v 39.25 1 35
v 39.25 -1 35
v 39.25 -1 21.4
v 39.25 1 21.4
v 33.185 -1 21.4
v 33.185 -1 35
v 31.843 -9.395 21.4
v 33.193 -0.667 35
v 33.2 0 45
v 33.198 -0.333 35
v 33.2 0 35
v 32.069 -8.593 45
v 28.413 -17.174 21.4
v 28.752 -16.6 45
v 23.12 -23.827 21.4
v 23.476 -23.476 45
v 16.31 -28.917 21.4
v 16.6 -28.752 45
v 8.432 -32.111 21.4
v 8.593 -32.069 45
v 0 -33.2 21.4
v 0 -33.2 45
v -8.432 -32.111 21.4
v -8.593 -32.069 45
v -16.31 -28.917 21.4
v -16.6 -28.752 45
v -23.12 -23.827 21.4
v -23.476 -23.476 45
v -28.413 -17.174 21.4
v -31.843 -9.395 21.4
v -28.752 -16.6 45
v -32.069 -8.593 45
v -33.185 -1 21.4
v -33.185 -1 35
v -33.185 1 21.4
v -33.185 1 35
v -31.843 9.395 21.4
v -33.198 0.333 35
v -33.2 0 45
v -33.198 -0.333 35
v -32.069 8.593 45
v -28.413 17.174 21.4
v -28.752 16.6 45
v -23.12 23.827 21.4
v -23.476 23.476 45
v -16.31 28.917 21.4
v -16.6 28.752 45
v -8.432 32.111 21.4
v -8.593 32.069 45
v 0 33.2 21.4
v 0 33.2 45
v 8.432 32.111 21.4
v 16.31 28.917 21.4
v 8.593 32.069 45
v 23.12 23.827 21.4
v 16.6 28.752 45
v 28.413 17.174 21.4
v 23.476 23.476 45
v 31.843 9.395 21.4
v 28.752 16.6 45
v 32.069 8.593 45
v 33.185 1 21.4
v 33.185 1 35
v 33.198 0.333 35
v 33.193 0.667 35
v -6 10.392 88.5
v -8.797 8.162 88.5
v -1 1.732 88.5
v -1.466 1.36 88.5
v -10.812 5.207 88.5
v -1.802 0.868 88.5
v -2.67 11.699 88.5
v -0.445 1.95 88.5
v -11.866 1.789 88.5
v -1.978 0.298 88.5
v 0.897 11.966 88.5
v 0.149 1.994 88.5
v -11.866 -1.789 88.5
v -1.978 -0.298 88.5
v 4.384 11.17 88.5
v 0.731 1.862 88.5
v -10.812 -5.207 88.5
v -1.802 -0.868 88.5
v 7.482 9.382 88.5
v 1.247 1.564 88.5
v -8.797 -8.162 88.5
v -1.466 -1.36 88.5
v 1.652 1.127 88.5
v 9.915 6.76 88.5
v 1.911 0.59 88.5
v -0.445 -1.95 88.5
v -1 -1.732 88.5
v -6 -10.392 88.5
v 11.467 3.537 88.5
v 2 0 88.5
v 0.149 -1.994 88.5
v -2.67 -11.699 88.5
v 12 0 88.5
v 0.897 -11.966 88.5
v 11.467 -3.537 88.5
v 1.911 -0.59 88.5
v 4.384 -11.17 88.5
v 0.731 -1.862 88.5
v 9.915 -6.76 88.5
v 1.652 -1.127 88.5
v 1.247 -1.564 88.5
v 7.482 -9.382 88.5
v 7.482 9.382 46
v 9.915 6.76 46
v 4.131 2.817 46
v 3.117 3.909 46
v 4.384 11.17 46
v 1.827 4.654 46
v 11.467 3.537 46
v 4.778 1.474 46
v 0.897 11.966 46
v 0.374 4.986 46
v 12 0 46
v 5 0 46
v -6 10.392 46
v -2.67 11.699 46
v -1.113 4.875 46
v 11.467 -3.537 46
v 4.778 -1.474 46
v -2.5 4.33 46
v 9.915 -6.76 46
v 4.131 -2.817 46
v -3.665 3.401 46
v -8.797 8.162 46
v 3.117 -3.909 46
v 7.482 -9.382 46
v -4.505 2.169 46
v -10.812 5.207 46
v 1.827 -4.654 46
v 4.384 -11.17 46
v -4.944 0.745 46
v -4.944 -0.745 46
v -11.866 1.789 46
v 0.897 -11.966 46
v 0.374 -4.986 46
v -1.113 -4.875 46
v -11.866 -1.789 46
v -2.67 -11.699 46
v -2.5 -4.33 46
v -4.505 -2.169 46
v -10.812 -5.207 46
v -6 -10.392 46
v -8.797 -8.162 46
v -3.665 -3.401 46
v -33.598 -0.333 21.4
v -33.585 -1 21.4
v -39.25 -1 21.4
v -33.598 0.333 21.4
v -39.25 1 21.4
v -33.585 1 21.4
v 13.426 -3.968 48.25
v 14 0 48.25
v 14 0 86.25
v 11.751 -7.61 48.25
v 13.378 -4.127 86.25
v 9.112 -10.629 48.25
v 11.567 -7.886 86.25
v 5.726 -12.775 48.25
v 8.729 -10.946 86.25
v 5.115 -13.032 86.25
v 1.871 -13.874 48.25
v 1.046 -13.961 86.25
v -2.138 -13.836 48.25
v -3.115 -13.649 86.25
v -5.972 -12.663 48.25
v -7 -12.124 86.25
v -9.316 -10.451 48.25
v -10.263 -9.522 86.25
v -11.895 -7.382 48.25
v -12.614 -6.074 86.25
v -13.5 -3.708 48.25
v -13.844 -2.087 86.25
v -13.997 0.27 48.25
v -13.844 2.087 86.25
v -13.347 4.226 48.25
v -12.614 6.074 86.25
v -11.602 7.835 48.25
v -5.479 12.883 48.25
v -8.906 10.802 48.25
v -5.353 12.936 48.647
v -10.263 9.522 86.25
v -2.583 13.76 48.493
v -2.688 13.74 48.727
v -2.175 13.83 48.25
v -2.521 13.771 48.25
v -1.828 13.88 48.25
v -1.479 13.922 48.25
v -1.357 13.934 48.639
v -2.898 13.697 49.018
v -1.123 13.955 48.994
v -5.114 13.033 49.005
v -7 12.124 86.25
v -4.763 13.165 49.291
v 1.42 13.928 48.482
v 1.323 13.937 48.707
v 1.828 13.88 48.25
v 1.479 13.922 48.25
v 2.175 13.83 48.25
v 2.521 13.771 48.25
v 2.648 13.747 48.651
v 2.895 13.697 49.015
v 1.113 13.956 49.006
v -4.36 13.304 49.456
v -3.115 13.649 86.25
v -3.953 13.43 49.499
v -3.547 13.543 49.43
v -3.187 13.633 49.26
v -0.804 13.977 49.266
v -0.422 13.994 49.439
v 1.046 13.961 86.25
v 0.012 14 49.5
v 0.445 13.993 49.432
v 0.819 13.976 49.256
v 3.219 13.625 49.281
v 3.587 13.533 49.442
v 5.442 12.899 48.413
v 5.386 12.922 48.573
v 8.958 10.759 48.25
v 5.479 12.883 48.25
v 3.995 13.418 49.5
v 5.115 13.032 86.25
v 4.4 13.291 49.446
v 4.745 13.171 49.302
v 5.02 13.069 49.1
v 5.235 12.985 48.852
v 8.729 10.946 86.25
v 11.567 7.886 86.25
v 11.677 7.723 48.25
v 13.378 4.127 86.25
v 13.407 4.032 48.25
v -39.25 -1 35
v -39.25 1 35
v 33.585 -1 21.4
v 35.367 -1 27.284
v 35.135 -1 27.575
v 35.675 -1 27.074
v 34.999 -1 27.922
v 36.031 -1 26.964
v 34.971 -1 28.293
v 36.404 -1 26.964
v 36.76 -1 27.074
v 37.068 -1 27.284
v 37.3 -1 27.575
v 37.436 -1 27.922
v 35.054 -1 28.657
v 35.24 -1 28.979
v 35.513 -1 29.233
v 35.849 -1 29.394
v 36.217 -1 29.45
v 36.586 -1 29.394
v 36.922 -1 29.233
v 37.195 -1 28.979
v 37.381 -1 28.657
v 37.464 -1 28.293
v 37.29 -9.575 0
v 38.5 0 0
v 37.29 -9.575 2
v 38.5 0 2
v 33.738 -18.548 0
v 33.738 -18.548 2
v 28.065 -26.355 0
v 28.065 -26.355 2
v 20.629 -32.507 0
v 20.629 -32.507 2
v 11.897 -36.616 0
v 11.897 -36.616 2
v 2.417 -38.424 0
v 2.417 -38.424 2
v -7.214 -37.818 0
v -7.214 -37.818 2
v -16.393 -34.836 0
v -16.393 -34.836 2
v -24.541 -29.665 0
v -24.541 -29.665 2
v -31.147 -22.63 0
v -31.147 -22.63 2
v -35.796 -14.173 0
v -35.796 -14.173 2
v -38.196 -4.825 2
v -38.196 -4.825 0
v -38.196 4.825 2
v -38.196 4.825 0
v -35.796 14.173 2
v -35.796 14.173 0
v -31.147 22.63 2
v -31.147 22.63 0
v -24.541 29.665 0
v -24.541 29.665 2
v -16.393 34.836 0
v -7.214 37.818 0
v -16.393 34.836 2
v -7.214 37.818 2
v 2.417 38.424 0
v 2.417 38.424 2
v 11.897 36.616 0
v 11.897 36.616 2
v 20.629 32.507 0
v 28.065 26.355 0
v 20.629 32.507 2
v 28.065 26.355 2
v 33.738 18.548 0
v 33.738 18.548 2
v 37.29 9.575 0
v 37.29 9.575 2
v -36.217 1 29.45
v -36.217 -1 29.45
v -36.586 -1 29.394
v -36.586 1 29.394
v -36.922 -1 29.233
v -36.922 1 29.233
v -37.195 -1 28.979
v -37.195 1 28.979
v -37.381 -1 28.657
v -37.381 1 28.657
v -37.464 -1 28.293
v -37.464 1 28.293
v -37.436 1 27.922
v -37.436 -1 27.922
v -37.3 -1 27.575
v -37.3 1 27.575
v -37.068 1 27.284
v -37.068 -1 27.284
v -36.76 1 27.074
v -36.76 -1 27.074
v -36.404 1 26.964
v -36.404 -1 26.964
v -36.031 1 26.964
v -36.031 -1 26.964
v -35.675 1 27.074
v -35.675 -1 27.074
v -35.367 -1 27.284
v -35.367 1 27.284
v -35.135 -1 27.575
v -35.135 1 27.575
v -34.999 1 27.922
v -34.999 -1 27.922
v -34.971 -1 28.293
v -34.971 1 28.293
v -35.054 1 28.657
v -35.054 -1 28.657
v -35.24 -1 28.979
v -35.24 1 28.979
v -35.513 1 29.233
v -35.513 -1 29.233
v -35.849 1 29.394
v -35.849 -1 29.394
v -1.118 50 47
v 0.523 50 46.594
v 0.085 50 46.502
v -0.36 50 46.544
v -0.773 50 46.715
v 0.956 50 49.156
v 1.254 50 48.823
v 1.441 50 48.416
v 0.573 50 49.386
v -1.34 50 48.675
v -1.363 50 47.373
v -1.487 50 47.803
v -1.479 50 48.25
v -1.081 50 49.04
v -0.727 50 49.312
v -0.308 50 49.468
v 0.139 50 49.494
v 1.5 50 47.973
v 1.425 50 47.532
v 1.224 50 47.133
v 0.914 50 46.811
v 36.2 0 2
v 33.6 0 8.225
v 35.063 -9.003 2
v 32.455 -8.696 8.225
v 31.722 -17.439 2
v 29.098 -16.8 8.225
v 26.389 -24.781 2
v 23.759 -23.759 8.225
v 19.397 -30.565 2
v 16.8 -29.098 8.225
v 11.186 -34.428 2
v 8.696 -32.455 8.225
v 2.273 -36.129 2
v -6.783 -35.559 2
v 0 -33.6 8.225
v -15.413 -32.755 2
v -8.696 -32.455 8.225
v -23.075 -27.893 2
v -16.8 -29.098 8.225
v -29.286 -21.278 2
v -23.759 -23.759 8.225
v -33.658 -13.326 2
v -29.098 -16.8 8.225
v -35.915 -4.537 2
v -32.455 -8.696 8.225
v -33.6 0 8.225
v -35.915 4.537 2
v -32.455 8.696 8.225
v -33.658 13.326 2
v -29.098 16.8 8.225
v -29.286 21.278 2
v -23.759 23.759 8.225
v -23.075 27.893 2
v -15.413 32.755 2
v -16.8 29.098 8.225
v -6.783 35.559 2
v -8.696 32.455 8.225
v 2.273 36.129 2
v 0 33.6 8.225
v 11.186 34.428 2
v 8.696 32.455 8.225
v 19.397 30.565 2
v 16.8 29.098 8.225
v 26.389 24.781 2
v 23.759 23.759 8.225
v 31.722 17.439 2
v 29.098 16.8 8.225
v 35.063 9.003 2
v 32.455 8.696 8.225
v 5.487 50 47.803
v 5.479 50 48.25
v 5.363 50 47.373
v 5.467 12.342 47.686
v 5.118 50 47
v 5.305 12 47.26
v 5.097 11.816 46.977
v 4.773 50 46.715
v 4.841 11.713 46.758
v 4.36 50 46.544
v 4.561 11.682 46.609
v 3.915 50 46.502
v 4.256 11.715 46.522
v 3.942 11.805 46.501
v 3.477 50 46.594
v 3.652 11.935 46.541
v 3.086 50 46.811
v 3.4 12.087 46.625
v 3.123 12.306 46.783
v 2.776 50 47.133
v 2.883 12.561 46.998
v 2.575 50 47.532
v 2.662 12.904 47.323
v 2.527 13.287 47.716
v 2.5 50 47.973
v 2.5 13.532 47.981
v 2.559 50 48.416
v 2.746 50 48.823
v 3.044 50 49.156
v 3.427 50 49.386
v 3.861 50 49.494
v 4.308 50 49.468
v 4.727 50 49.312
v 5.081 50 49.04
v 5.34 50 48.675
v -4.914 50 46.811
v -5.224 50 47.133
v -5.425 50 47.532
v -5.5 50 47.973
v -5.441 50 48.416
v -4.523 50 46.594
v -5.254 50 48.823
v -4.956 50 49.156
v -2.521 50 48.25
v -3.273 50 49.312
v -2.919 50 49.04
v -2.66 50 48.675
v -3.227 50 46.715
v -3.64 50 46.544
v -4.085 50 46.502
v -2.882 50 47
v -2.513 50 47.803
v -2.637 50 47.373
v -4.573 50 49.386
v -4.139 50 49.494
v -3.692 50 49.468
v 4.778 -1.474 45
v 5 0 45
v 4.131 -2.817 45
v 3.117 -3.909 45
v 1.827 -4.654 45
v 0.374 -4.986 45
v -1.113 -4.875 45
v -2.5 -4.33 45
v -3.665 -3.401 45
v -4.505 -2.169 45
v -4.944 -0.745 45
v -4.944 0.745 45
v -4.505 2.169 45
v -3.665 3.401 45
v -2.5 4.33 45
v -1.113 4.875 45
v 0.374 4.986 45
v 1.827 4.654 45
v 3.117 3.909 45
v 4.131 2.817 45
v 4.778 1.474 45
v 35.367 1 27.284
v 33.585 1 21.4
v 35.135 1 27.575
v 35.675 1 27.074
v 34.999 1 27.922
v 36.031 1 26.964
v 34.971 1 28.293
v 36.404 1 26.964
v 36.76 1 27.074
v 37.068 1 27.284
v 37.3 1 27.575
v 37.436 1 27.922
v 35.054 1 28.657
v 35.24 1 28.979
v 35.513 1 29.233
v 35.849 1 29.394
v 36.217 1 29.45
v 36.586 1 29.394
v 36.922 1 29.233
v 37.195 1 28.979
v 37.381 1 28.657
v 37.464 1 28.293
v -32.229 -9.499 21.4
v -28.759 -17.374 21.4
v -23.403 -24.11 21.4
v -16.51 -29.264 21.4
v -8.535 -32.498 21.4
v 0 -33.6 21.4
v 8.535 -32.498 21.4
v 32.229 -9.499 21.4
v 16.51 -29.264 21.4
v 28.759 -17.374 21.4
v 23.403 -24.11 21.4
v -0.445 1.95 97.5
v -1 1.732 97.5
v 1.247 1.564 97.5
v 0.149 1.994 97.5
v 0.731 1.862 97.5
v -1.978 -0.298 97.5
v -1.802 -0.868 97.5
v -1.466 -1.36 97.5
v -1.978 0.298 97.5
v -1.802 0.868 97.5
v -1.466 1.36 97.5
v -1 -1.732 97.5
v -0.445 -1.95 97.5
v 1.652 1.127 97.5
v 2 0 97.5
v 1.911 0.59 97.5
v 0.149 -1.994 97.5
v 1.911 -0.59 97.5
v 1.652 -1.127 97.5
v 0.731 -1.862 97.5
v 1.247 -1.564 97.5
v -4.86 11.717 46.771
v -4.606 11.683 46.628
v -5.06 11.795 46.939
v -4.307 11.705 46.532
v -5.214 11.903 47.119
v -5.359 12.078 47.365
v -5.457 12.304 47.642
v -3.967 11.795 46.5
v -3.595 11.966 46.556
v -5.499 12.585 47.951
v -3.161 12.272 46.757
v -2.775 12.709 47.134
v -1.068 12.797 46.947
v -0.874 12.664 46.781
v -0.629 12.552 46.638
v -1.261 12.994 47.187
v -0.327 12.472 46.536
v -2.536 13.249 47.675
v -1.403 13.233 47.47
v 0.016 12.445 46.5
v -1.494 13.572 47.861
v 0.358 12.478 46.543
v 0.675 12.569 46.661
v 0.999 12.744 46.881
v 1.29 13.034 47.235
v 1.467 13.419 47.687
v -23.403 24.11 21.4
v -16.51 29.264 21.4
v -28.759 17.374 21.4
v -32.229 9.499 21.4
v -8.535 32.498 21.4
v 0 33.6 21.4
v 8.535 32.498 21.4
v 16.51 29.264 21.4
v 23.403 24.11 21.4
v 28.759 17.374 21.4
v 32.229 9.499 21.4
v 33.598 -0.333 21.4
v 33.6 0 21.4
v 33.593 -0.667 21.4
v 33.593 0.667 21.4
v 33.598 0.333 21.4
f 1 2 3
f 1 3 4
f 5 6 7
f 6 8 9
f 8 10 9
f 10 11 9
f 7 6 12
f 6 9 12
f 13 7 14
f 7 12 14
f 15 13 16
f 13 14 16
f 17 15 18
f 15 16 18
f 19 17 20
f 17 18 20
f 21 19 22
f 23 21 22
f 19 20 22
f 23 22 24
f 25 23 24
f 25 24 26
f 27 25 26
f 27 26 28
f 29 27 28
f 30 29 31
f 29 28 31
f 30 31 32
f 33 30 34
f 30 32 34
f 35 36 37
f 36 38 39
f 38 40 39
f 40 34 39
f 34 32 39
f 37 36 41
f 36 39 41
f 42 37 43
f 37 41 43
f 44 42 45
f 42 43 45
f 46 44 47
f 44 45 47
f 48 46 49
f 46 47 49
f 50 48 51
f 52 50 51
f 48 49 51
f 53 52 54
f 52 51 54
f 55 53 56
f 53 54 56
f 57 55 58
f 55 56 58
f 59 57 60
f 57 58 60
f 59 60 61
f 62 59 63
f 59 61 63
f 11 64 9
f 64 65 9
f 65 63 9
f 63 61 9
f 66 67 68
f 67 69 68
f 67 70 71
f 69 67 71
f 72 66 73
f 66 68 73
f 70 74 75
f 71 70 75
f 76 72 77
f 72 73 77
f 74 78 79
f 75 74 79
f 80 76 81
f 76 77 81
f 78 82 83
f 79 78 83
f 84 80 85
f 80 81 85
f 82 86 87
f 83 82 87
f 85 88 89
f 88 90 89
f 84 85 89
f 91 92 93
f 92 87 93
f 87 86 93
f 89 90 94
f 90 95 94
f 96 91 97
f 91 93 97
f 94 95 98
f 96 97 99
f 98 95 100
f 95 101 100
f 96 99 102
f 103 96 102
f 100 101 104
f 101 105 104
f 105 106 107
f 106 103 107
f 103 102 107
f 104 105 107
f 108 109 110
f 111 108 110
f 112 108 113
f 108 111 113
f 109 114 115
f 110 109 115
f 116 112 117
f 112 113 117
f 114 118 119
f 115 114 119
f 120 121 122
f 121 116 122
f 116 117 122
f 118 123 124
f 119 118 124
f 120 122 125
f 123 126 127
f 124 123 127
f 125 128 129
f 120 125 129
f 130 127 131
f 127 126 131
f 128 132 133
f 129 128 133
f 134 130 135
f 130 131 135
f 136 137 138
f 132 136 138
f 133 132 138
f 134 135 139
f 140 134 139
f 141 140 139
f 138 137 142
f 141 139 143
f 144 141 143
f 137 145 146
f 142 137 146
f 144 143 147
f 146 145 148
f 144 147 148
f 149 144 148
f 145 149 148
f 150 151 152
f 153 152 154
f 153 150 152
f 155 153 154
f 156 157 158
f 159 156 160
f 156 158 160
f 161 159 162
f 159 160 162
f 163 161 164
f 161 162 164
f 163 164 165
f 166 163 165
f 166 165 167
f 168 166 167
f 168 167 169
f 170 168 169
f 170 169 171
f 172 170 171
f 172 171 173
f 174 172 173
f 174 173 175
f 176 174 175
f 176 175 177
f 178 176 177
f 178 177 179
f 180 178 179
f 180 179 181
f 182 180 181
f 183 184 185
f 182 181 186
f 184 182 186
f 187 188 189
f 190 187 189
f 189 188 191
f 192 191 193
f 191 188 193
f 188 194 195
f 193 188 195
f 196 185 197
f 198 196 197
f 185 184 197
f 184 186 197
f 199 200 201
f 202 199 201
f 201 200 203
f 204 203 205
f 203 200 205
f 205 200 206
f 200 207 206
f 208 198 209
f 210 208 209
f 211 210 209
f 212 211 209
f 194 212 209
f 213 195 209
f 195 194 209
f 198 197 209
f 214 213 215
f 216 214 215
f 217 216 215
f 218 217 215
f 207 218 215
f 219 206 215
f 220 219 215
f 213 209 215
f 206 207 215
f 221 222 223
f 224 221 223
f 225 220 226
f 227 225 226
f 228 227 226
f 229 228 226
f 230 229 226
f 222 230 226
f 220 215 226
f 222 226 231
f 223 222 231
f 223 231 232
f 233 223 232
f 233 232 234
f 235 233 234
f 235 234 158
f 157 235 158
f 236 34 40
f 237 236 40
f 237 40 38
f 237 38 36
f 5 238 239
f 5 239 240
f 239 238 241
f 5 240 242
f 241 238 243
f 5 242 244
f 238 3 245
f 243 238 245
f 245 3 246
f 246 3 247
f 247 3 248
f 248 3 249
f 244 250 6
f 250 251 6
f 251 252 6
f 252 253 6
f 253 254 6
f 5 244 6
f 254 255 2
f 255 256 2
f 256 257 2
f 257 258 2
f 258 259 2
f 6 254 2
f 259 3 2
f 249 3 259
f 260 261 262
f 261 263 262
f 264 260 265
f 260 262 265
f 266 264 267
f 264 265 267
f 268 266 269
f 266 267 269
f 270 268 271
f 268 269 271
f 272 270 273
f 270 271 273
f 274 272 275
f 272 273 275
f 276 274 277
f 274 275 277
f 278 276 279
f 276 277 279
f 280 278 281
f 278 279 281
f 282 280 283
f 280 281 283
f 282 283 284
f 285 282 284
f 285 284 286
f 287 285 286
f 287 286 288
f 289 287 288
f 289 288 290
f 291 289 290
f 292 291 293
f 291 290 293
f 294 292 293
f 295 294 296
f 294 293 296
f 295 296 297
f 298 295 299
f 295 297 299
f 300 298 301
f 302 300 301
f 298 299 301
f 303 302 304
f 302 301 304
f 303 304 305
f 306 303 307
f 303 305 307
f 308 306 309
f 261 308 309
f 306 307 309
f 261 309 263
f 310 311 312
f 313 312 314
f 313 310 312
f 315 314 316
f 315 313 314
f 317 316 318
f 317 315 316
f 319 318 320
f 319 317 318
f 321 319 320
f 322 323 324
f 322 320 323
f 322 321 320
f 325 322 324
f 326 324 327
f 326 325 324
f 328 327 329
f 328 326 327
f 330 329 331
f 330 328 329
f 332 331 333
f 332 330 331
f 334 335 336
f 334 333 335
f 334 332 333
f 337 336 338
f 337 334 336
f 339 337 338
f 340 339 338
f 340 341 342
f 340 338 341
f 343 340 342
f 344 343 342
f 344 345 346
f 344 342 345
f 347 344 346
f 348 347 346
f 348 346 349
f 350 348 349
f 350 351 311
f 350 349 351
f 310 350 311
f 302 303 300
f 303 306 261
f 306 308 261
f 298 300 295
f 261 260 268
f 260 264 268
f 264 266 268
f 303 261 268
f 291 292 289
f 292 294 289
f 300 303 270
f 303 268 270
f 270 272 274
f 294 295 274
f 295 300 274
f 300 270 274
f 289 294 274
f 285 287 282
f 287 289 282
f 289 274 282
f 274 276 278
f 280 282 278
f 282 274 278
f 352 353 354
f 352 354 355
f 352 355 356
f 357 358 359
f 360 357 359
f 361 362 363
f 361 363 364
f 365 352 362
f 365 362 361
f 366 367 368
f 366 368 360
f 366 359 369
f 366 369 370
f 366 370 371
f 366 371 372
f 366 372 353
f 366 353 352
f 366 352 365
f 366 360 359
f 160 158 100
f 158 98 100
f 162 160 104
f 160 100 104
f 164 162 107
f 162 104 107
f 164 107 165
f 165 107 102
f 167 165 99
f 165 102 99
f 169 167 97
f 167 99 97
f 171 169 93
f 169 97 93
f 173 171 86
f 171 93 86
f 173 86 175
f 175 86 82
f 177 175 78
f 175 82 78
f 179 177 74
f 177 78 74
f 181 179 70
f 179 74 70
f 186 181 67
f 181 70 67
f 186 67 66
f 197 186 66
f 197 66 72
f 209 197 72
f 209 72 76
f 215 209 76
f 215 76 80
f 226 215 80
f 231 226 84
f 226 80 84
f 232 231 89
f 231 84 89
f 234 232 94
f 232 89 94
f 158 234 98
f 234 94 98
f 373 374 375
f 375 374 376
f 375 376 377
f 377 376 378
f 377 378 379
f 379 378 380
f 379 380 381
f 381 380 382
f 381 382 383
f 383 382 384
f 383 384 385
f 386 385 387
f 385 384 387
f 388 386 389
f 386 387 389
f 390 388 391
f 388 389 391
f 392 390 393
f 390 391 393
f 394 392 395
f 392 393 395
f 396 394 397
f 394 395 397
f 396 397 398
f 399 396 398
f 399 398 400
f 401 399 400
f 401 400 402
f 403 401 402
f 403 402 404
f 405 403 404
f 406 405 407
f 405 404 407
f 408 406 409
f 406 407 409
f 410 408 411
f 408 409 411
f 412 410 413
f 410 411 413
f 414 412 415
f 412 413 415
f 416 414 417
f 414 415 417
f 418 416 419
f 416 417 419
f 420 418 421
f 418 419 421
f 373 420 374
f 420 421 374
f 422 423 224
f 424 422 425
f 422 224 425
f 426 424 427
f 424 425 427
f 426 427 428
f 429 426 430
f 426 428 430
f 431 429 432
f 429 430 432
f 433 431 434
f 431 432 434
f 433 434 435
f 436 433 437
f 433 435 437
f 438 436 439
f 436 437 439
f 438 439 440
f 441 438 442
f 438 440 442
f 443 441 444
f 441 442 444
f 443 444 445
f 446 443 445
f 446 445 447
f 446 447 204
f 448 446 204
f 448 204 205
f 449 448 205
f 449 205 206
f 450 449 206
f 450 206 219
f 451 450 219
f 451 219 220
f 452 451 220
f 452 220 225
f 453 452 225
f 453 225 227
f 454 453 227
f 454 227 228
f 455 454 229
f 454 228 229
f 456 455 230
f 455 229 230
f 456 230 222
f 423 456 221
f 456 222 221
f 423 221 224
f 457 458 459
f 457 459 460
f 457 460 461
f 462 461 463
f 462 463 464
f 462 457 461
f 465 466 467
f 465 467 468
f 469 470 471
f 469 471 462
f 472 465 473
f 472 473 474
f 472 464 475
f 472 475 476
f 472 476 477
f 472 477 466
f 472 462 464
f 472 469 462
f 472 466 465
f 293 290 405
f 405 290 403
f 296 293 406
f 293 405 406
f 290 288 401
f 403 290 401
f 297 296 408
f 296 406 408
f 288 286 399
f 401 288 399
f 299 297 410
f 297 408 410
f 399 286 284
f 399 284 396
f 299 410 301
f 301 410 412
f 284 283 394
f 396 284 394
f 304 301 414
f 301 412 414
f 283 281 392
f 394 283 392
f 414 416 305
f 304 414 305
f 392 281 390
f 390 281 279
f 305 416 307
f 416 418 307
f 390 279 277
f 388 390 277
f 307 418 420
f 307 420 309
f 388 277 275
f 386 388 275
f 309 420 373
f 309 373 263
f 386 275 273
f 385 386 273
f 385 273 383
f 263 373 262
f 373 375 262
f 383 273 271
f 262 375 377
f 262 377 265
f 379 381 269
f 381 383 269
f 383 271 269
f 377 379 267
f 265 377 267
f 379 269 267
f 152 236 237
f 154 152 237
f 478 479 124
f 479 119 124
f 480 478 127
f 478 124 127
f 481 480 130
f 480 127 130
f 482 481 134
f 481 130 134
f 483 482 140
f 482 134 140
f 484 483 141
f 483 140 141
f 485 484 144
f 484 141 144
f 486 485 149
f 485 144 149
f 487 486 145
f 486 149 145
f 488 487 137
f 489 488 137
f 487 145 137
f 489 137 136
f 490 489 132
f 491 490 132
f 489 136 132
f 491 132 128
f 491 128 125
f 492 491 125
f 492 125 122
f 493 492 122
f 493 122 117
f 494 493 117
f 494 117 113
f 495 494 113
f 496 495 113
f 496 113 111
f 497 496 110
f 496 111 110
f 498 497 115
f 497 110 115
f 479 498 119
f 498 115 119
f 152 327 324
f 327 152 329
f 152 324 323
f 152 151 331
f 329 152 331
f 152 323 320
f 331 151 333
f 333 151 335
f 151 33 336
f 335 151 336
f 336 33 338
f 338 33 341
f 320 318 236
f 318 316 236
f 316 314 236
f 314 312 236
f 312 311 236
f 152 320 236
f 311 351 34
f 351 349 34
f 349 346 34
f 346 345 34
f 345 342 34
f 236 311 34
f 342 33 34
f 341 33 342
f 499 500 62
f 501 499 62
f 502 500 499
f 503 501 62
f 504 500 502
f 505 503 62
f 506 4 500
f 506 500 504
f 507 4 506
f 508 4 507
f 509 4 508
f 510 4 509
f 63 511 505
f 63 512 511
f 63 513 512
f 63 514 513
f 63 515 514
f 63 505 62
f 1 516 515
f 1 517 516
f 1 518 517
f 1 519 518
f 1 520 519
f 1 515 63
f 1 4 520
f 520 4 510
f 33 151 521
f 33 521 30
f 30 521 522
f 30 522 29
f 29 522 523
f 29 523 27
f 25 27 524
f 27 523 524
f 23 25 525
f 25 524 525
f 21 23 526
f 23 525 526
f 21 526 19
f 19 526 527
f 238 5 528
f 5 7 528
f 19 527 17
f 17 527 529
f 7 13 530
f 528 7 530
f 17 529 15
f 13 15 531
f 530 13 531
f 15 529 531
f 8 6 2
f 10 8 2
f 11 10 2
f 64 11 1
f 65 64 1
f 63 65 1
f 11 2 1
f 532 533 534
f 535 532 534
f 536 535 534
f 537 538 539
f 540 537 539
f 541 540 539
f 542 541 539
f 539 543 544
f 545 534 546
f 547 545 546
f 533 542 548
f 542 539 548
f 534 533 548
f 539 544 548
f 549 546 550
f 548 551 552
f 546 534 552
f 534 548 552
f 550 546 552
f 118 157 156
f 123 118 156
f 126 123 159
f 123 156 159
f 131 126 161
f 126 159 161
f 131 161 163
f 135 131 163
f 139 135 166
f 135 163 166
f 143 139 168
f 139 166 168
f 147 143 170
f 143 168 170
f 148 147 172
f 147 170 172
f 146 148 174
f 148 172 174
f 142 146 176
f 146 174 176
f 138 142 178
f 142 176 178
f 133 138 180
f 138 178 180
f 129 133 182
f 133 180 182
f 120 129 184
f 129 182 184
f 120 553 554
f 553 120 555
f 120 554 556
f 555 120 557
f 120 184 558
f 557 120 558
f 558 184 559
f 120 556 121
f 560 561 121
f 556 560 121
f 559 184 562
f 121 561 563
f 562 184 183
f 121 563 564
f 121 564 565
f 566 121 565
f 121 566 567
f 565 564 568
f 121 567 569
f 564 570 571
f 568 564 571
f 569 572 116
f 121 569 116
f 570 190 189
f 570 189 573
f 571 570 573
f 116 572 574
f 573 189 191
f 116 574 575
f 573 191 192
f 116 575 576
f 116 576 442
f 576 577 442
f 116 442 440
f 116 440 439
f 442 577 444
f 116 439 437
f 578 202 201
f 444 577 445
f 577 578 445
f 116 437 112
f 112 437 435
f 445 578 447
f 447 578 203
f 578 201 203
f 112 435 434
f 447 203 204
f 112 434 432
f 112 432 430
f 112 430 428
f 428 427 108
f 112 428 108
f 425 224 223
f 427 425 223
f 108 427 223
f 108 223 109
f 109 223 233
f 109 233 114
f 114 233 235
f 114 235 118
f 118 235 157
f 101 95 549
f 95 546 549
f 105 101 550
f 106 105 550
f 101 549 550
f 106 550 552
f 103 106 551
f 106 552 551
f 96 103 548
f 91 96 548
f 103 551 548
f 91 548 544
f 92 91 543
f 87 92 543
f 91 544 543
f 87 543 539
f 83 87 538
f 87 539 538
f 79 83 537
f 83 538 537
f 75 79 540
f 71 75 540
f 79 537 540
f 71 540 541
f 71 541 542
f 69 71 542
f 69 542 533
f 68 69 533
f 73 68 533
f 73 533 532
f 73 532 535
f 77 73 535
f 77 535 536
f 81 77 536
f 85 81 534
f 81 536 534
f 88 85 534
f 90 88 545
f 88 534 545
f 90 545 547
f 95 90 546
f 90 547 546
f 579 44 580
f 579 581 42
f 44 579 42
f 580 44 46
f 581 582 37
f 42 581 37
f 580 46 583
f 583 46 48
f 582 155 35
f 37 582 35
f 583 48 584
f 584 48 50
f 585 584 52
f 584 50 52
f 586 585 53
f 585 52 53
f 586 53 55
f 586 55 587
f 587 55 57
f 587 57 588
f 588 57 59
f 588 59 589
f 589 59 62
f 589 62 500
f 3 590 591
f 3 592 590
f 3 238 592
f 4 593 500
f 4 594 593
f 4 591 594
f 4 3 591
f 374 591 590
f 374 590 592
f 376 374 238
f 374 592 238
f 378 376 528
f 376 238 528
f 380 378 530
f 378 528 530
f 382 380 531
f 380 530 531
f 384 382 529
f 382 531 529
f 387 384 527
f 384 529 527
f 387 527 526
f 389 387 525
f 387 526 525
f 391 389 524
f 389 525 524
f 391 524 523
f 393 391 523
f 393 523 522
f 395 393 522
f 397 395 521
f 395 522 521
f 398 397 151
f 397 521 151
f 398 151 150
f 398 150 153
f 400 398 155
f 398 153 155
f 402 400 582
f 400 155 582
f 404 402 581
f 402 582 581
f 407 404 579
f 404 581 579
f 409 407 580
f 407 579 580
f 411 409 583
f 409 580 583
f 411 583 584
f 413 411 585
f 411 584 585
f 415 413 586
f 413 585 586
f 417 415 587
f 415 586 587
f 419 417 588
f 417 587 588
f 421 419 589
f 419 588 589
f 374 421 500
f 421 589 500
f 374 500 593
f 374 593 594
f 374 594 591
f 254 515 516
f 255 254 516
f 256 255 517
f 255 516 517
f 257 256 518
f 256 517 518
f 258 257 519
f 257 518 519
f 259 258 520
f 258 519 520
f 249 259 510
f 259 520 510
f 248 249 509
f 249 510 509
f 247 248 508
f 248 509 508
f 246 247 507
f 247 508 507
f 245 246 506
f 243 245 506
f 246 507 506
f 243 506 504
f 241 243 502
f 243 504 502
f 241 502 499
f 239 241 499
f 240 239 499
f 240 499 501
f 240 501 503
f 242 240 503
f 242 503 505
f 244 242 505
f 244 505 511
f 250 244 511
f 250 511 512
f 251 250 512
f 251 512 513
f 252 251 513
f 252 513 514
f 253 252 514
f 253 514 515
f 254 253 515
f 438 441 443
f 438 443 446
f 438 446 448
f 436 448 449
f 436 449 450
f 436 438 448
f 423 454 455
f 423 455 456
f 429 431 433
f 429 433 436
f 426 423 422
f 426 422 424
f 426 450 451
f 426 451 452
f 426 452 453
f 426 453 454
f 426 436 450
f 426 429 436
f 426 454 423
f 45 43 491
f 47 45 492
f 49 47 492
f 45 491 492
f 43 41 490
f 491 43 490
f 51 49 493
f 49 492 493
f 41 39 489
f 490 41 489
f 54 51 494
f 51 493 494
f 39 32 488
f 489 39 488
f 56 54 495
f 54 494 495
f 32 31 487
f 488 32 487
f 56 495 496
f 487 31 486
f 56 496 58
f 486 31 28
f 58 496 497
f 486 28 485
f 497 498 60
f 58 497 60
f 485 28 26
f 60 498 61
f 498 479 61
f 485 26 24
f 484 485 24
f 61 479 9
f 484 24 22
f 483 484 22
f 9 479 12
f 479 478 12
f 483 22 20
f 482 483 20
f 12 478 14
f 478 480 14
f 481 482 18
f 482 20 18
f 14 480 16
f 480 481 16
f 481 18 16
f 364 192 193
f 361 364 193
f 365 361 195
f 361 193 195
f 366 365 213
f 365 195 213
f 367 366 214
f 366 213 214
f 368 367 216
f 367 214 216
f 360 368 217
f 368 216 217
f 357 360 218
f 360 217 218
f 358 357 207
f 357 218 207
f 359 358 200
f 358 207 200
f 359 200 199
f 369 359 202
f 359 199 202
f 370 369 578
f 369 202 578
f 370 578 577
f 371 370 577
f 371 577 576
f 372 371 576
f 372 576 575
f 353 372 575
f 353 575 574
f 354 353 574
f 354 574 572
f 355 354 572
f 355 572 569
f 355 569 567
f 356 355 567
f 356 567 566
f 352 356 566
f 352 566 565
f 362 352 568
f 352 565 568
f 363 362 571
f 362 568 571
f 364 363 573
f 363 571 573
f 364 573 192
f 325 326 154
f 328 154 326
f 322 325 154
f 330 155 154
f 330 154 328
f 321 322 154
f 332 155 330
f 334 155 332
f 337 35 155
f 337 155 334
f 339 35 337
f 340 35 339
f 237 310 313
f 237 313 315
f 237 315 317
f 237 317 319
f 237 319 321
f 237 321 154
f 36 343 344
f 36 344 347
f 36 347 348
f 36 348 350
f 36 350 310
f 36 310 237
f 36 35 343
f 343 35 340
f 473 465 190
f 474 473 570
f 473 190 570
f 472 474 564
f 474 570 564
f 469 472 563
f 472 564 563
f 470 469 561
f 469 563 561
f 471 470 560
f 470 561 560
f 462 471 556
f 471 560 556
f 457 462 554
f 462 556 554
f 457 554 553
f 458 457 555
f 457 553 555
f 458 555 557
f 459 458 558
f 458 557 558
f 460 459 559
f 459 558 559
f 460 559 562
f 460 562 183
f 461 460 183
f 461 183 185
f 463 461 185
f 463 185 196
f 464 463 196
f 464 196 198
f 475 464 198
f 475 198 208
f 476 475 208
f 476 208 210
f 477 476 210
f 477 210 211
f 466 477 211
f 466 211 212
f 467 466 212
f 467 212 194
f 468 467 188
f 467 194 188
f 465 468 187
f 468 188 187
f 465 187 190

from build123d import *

# Parameters (mm, degrees)
SKETCH3_W           = 2
SKETCH3_H           = 13.6
BOSS_EXTRUDE1_DEPTH = 39.25
SKETCH4_R           = 1.25
CUT_EXTRUDE1_DEPTH  = 113.281176072
SKETCH5_R           = 1.5
BOSS_EXTRUDE5_DEPTH = 50


with BuildPart() as part:
    # Sketch1 → Revolve1 (revolve)
    with BuildSketch(Plane.YZ, mode=Mode.PRIVATE) as revolve1_sk:
        Polygon((0, 0), (38.5, 0), (38.5, 2), (36.2, 2), (33.6, 8.225), (33.6, 21.4), (33.2, 21.4), (33.2, 45), (5, 45), (5, 46), (12, 46), (14, 48.25), (14, 86.25), (12, 88.5), (2, 88.5), (2, 97.5), (0, 97.5), align=None)
    revolve(revolve1_sk.sketch.rotate(Axis((0, 0, 0), (0, 0, -1)), 90), axis=Axis((0, 0, 0), (0, 0, -1)))

    # Sketch3 → Boss-Extrude1 (add, symmetric)
    with BuildSketch(Plane.YZ):
        with Locations((0, 28.2)):
            Rectangle(SKETCH3_W, SKETCH3_H)
    extrude(amount=BOSS_EXTRUDE1_DEPTH, both=True)

    # Sketch4 → Cut-Extrude1 (cut, through all)
    with BuildSketch(Plane(origin=(0, 1, 0), x_dir=(-1, 0, 0), z_dir=(0, 1, 0))):
        with Locations(Location((-36.217468171, 28.2, 0), (0, 0, 90))):
            Circle(SKETCH4_R)
    cut_extrude1 = extrude(amount=-CUT_EXTRUDE1_DEPTH, mode=Mode.SUBTRACT)

    # Mirror1: Cut-Extrude1 across plane
    add(cut_extrude1.mirror(Plane(origin=(0, 0, 0), x_dir=(0, 0, 1), z_dir=(1, 0, 0))), mode=Mode.SUBTRACT)

    # Sketch5 → Boss-Extrude5 (add)
    with BuildSketch(Plane(origin=(0, 0, 0), x_dir=(-1, 0, 0), z_dir=(0, 1, 0))):
        with Locations(Location((0, 48, 0), (0, 0, 9.594065947))):
            Circle(SKETCH5_R)
        with Locations(Location((4, 48, 0), (0, 0, 170.405931773))):
            Circle(SKETCH5_R)
        with Locations(Location((-4, 48, 0), (0, 0, 170.405931773))):
            Circle(SKETCH5_R)
    extrude(amount=BOSS_EXTRUDE5_DEPTH)


solid = part.part
